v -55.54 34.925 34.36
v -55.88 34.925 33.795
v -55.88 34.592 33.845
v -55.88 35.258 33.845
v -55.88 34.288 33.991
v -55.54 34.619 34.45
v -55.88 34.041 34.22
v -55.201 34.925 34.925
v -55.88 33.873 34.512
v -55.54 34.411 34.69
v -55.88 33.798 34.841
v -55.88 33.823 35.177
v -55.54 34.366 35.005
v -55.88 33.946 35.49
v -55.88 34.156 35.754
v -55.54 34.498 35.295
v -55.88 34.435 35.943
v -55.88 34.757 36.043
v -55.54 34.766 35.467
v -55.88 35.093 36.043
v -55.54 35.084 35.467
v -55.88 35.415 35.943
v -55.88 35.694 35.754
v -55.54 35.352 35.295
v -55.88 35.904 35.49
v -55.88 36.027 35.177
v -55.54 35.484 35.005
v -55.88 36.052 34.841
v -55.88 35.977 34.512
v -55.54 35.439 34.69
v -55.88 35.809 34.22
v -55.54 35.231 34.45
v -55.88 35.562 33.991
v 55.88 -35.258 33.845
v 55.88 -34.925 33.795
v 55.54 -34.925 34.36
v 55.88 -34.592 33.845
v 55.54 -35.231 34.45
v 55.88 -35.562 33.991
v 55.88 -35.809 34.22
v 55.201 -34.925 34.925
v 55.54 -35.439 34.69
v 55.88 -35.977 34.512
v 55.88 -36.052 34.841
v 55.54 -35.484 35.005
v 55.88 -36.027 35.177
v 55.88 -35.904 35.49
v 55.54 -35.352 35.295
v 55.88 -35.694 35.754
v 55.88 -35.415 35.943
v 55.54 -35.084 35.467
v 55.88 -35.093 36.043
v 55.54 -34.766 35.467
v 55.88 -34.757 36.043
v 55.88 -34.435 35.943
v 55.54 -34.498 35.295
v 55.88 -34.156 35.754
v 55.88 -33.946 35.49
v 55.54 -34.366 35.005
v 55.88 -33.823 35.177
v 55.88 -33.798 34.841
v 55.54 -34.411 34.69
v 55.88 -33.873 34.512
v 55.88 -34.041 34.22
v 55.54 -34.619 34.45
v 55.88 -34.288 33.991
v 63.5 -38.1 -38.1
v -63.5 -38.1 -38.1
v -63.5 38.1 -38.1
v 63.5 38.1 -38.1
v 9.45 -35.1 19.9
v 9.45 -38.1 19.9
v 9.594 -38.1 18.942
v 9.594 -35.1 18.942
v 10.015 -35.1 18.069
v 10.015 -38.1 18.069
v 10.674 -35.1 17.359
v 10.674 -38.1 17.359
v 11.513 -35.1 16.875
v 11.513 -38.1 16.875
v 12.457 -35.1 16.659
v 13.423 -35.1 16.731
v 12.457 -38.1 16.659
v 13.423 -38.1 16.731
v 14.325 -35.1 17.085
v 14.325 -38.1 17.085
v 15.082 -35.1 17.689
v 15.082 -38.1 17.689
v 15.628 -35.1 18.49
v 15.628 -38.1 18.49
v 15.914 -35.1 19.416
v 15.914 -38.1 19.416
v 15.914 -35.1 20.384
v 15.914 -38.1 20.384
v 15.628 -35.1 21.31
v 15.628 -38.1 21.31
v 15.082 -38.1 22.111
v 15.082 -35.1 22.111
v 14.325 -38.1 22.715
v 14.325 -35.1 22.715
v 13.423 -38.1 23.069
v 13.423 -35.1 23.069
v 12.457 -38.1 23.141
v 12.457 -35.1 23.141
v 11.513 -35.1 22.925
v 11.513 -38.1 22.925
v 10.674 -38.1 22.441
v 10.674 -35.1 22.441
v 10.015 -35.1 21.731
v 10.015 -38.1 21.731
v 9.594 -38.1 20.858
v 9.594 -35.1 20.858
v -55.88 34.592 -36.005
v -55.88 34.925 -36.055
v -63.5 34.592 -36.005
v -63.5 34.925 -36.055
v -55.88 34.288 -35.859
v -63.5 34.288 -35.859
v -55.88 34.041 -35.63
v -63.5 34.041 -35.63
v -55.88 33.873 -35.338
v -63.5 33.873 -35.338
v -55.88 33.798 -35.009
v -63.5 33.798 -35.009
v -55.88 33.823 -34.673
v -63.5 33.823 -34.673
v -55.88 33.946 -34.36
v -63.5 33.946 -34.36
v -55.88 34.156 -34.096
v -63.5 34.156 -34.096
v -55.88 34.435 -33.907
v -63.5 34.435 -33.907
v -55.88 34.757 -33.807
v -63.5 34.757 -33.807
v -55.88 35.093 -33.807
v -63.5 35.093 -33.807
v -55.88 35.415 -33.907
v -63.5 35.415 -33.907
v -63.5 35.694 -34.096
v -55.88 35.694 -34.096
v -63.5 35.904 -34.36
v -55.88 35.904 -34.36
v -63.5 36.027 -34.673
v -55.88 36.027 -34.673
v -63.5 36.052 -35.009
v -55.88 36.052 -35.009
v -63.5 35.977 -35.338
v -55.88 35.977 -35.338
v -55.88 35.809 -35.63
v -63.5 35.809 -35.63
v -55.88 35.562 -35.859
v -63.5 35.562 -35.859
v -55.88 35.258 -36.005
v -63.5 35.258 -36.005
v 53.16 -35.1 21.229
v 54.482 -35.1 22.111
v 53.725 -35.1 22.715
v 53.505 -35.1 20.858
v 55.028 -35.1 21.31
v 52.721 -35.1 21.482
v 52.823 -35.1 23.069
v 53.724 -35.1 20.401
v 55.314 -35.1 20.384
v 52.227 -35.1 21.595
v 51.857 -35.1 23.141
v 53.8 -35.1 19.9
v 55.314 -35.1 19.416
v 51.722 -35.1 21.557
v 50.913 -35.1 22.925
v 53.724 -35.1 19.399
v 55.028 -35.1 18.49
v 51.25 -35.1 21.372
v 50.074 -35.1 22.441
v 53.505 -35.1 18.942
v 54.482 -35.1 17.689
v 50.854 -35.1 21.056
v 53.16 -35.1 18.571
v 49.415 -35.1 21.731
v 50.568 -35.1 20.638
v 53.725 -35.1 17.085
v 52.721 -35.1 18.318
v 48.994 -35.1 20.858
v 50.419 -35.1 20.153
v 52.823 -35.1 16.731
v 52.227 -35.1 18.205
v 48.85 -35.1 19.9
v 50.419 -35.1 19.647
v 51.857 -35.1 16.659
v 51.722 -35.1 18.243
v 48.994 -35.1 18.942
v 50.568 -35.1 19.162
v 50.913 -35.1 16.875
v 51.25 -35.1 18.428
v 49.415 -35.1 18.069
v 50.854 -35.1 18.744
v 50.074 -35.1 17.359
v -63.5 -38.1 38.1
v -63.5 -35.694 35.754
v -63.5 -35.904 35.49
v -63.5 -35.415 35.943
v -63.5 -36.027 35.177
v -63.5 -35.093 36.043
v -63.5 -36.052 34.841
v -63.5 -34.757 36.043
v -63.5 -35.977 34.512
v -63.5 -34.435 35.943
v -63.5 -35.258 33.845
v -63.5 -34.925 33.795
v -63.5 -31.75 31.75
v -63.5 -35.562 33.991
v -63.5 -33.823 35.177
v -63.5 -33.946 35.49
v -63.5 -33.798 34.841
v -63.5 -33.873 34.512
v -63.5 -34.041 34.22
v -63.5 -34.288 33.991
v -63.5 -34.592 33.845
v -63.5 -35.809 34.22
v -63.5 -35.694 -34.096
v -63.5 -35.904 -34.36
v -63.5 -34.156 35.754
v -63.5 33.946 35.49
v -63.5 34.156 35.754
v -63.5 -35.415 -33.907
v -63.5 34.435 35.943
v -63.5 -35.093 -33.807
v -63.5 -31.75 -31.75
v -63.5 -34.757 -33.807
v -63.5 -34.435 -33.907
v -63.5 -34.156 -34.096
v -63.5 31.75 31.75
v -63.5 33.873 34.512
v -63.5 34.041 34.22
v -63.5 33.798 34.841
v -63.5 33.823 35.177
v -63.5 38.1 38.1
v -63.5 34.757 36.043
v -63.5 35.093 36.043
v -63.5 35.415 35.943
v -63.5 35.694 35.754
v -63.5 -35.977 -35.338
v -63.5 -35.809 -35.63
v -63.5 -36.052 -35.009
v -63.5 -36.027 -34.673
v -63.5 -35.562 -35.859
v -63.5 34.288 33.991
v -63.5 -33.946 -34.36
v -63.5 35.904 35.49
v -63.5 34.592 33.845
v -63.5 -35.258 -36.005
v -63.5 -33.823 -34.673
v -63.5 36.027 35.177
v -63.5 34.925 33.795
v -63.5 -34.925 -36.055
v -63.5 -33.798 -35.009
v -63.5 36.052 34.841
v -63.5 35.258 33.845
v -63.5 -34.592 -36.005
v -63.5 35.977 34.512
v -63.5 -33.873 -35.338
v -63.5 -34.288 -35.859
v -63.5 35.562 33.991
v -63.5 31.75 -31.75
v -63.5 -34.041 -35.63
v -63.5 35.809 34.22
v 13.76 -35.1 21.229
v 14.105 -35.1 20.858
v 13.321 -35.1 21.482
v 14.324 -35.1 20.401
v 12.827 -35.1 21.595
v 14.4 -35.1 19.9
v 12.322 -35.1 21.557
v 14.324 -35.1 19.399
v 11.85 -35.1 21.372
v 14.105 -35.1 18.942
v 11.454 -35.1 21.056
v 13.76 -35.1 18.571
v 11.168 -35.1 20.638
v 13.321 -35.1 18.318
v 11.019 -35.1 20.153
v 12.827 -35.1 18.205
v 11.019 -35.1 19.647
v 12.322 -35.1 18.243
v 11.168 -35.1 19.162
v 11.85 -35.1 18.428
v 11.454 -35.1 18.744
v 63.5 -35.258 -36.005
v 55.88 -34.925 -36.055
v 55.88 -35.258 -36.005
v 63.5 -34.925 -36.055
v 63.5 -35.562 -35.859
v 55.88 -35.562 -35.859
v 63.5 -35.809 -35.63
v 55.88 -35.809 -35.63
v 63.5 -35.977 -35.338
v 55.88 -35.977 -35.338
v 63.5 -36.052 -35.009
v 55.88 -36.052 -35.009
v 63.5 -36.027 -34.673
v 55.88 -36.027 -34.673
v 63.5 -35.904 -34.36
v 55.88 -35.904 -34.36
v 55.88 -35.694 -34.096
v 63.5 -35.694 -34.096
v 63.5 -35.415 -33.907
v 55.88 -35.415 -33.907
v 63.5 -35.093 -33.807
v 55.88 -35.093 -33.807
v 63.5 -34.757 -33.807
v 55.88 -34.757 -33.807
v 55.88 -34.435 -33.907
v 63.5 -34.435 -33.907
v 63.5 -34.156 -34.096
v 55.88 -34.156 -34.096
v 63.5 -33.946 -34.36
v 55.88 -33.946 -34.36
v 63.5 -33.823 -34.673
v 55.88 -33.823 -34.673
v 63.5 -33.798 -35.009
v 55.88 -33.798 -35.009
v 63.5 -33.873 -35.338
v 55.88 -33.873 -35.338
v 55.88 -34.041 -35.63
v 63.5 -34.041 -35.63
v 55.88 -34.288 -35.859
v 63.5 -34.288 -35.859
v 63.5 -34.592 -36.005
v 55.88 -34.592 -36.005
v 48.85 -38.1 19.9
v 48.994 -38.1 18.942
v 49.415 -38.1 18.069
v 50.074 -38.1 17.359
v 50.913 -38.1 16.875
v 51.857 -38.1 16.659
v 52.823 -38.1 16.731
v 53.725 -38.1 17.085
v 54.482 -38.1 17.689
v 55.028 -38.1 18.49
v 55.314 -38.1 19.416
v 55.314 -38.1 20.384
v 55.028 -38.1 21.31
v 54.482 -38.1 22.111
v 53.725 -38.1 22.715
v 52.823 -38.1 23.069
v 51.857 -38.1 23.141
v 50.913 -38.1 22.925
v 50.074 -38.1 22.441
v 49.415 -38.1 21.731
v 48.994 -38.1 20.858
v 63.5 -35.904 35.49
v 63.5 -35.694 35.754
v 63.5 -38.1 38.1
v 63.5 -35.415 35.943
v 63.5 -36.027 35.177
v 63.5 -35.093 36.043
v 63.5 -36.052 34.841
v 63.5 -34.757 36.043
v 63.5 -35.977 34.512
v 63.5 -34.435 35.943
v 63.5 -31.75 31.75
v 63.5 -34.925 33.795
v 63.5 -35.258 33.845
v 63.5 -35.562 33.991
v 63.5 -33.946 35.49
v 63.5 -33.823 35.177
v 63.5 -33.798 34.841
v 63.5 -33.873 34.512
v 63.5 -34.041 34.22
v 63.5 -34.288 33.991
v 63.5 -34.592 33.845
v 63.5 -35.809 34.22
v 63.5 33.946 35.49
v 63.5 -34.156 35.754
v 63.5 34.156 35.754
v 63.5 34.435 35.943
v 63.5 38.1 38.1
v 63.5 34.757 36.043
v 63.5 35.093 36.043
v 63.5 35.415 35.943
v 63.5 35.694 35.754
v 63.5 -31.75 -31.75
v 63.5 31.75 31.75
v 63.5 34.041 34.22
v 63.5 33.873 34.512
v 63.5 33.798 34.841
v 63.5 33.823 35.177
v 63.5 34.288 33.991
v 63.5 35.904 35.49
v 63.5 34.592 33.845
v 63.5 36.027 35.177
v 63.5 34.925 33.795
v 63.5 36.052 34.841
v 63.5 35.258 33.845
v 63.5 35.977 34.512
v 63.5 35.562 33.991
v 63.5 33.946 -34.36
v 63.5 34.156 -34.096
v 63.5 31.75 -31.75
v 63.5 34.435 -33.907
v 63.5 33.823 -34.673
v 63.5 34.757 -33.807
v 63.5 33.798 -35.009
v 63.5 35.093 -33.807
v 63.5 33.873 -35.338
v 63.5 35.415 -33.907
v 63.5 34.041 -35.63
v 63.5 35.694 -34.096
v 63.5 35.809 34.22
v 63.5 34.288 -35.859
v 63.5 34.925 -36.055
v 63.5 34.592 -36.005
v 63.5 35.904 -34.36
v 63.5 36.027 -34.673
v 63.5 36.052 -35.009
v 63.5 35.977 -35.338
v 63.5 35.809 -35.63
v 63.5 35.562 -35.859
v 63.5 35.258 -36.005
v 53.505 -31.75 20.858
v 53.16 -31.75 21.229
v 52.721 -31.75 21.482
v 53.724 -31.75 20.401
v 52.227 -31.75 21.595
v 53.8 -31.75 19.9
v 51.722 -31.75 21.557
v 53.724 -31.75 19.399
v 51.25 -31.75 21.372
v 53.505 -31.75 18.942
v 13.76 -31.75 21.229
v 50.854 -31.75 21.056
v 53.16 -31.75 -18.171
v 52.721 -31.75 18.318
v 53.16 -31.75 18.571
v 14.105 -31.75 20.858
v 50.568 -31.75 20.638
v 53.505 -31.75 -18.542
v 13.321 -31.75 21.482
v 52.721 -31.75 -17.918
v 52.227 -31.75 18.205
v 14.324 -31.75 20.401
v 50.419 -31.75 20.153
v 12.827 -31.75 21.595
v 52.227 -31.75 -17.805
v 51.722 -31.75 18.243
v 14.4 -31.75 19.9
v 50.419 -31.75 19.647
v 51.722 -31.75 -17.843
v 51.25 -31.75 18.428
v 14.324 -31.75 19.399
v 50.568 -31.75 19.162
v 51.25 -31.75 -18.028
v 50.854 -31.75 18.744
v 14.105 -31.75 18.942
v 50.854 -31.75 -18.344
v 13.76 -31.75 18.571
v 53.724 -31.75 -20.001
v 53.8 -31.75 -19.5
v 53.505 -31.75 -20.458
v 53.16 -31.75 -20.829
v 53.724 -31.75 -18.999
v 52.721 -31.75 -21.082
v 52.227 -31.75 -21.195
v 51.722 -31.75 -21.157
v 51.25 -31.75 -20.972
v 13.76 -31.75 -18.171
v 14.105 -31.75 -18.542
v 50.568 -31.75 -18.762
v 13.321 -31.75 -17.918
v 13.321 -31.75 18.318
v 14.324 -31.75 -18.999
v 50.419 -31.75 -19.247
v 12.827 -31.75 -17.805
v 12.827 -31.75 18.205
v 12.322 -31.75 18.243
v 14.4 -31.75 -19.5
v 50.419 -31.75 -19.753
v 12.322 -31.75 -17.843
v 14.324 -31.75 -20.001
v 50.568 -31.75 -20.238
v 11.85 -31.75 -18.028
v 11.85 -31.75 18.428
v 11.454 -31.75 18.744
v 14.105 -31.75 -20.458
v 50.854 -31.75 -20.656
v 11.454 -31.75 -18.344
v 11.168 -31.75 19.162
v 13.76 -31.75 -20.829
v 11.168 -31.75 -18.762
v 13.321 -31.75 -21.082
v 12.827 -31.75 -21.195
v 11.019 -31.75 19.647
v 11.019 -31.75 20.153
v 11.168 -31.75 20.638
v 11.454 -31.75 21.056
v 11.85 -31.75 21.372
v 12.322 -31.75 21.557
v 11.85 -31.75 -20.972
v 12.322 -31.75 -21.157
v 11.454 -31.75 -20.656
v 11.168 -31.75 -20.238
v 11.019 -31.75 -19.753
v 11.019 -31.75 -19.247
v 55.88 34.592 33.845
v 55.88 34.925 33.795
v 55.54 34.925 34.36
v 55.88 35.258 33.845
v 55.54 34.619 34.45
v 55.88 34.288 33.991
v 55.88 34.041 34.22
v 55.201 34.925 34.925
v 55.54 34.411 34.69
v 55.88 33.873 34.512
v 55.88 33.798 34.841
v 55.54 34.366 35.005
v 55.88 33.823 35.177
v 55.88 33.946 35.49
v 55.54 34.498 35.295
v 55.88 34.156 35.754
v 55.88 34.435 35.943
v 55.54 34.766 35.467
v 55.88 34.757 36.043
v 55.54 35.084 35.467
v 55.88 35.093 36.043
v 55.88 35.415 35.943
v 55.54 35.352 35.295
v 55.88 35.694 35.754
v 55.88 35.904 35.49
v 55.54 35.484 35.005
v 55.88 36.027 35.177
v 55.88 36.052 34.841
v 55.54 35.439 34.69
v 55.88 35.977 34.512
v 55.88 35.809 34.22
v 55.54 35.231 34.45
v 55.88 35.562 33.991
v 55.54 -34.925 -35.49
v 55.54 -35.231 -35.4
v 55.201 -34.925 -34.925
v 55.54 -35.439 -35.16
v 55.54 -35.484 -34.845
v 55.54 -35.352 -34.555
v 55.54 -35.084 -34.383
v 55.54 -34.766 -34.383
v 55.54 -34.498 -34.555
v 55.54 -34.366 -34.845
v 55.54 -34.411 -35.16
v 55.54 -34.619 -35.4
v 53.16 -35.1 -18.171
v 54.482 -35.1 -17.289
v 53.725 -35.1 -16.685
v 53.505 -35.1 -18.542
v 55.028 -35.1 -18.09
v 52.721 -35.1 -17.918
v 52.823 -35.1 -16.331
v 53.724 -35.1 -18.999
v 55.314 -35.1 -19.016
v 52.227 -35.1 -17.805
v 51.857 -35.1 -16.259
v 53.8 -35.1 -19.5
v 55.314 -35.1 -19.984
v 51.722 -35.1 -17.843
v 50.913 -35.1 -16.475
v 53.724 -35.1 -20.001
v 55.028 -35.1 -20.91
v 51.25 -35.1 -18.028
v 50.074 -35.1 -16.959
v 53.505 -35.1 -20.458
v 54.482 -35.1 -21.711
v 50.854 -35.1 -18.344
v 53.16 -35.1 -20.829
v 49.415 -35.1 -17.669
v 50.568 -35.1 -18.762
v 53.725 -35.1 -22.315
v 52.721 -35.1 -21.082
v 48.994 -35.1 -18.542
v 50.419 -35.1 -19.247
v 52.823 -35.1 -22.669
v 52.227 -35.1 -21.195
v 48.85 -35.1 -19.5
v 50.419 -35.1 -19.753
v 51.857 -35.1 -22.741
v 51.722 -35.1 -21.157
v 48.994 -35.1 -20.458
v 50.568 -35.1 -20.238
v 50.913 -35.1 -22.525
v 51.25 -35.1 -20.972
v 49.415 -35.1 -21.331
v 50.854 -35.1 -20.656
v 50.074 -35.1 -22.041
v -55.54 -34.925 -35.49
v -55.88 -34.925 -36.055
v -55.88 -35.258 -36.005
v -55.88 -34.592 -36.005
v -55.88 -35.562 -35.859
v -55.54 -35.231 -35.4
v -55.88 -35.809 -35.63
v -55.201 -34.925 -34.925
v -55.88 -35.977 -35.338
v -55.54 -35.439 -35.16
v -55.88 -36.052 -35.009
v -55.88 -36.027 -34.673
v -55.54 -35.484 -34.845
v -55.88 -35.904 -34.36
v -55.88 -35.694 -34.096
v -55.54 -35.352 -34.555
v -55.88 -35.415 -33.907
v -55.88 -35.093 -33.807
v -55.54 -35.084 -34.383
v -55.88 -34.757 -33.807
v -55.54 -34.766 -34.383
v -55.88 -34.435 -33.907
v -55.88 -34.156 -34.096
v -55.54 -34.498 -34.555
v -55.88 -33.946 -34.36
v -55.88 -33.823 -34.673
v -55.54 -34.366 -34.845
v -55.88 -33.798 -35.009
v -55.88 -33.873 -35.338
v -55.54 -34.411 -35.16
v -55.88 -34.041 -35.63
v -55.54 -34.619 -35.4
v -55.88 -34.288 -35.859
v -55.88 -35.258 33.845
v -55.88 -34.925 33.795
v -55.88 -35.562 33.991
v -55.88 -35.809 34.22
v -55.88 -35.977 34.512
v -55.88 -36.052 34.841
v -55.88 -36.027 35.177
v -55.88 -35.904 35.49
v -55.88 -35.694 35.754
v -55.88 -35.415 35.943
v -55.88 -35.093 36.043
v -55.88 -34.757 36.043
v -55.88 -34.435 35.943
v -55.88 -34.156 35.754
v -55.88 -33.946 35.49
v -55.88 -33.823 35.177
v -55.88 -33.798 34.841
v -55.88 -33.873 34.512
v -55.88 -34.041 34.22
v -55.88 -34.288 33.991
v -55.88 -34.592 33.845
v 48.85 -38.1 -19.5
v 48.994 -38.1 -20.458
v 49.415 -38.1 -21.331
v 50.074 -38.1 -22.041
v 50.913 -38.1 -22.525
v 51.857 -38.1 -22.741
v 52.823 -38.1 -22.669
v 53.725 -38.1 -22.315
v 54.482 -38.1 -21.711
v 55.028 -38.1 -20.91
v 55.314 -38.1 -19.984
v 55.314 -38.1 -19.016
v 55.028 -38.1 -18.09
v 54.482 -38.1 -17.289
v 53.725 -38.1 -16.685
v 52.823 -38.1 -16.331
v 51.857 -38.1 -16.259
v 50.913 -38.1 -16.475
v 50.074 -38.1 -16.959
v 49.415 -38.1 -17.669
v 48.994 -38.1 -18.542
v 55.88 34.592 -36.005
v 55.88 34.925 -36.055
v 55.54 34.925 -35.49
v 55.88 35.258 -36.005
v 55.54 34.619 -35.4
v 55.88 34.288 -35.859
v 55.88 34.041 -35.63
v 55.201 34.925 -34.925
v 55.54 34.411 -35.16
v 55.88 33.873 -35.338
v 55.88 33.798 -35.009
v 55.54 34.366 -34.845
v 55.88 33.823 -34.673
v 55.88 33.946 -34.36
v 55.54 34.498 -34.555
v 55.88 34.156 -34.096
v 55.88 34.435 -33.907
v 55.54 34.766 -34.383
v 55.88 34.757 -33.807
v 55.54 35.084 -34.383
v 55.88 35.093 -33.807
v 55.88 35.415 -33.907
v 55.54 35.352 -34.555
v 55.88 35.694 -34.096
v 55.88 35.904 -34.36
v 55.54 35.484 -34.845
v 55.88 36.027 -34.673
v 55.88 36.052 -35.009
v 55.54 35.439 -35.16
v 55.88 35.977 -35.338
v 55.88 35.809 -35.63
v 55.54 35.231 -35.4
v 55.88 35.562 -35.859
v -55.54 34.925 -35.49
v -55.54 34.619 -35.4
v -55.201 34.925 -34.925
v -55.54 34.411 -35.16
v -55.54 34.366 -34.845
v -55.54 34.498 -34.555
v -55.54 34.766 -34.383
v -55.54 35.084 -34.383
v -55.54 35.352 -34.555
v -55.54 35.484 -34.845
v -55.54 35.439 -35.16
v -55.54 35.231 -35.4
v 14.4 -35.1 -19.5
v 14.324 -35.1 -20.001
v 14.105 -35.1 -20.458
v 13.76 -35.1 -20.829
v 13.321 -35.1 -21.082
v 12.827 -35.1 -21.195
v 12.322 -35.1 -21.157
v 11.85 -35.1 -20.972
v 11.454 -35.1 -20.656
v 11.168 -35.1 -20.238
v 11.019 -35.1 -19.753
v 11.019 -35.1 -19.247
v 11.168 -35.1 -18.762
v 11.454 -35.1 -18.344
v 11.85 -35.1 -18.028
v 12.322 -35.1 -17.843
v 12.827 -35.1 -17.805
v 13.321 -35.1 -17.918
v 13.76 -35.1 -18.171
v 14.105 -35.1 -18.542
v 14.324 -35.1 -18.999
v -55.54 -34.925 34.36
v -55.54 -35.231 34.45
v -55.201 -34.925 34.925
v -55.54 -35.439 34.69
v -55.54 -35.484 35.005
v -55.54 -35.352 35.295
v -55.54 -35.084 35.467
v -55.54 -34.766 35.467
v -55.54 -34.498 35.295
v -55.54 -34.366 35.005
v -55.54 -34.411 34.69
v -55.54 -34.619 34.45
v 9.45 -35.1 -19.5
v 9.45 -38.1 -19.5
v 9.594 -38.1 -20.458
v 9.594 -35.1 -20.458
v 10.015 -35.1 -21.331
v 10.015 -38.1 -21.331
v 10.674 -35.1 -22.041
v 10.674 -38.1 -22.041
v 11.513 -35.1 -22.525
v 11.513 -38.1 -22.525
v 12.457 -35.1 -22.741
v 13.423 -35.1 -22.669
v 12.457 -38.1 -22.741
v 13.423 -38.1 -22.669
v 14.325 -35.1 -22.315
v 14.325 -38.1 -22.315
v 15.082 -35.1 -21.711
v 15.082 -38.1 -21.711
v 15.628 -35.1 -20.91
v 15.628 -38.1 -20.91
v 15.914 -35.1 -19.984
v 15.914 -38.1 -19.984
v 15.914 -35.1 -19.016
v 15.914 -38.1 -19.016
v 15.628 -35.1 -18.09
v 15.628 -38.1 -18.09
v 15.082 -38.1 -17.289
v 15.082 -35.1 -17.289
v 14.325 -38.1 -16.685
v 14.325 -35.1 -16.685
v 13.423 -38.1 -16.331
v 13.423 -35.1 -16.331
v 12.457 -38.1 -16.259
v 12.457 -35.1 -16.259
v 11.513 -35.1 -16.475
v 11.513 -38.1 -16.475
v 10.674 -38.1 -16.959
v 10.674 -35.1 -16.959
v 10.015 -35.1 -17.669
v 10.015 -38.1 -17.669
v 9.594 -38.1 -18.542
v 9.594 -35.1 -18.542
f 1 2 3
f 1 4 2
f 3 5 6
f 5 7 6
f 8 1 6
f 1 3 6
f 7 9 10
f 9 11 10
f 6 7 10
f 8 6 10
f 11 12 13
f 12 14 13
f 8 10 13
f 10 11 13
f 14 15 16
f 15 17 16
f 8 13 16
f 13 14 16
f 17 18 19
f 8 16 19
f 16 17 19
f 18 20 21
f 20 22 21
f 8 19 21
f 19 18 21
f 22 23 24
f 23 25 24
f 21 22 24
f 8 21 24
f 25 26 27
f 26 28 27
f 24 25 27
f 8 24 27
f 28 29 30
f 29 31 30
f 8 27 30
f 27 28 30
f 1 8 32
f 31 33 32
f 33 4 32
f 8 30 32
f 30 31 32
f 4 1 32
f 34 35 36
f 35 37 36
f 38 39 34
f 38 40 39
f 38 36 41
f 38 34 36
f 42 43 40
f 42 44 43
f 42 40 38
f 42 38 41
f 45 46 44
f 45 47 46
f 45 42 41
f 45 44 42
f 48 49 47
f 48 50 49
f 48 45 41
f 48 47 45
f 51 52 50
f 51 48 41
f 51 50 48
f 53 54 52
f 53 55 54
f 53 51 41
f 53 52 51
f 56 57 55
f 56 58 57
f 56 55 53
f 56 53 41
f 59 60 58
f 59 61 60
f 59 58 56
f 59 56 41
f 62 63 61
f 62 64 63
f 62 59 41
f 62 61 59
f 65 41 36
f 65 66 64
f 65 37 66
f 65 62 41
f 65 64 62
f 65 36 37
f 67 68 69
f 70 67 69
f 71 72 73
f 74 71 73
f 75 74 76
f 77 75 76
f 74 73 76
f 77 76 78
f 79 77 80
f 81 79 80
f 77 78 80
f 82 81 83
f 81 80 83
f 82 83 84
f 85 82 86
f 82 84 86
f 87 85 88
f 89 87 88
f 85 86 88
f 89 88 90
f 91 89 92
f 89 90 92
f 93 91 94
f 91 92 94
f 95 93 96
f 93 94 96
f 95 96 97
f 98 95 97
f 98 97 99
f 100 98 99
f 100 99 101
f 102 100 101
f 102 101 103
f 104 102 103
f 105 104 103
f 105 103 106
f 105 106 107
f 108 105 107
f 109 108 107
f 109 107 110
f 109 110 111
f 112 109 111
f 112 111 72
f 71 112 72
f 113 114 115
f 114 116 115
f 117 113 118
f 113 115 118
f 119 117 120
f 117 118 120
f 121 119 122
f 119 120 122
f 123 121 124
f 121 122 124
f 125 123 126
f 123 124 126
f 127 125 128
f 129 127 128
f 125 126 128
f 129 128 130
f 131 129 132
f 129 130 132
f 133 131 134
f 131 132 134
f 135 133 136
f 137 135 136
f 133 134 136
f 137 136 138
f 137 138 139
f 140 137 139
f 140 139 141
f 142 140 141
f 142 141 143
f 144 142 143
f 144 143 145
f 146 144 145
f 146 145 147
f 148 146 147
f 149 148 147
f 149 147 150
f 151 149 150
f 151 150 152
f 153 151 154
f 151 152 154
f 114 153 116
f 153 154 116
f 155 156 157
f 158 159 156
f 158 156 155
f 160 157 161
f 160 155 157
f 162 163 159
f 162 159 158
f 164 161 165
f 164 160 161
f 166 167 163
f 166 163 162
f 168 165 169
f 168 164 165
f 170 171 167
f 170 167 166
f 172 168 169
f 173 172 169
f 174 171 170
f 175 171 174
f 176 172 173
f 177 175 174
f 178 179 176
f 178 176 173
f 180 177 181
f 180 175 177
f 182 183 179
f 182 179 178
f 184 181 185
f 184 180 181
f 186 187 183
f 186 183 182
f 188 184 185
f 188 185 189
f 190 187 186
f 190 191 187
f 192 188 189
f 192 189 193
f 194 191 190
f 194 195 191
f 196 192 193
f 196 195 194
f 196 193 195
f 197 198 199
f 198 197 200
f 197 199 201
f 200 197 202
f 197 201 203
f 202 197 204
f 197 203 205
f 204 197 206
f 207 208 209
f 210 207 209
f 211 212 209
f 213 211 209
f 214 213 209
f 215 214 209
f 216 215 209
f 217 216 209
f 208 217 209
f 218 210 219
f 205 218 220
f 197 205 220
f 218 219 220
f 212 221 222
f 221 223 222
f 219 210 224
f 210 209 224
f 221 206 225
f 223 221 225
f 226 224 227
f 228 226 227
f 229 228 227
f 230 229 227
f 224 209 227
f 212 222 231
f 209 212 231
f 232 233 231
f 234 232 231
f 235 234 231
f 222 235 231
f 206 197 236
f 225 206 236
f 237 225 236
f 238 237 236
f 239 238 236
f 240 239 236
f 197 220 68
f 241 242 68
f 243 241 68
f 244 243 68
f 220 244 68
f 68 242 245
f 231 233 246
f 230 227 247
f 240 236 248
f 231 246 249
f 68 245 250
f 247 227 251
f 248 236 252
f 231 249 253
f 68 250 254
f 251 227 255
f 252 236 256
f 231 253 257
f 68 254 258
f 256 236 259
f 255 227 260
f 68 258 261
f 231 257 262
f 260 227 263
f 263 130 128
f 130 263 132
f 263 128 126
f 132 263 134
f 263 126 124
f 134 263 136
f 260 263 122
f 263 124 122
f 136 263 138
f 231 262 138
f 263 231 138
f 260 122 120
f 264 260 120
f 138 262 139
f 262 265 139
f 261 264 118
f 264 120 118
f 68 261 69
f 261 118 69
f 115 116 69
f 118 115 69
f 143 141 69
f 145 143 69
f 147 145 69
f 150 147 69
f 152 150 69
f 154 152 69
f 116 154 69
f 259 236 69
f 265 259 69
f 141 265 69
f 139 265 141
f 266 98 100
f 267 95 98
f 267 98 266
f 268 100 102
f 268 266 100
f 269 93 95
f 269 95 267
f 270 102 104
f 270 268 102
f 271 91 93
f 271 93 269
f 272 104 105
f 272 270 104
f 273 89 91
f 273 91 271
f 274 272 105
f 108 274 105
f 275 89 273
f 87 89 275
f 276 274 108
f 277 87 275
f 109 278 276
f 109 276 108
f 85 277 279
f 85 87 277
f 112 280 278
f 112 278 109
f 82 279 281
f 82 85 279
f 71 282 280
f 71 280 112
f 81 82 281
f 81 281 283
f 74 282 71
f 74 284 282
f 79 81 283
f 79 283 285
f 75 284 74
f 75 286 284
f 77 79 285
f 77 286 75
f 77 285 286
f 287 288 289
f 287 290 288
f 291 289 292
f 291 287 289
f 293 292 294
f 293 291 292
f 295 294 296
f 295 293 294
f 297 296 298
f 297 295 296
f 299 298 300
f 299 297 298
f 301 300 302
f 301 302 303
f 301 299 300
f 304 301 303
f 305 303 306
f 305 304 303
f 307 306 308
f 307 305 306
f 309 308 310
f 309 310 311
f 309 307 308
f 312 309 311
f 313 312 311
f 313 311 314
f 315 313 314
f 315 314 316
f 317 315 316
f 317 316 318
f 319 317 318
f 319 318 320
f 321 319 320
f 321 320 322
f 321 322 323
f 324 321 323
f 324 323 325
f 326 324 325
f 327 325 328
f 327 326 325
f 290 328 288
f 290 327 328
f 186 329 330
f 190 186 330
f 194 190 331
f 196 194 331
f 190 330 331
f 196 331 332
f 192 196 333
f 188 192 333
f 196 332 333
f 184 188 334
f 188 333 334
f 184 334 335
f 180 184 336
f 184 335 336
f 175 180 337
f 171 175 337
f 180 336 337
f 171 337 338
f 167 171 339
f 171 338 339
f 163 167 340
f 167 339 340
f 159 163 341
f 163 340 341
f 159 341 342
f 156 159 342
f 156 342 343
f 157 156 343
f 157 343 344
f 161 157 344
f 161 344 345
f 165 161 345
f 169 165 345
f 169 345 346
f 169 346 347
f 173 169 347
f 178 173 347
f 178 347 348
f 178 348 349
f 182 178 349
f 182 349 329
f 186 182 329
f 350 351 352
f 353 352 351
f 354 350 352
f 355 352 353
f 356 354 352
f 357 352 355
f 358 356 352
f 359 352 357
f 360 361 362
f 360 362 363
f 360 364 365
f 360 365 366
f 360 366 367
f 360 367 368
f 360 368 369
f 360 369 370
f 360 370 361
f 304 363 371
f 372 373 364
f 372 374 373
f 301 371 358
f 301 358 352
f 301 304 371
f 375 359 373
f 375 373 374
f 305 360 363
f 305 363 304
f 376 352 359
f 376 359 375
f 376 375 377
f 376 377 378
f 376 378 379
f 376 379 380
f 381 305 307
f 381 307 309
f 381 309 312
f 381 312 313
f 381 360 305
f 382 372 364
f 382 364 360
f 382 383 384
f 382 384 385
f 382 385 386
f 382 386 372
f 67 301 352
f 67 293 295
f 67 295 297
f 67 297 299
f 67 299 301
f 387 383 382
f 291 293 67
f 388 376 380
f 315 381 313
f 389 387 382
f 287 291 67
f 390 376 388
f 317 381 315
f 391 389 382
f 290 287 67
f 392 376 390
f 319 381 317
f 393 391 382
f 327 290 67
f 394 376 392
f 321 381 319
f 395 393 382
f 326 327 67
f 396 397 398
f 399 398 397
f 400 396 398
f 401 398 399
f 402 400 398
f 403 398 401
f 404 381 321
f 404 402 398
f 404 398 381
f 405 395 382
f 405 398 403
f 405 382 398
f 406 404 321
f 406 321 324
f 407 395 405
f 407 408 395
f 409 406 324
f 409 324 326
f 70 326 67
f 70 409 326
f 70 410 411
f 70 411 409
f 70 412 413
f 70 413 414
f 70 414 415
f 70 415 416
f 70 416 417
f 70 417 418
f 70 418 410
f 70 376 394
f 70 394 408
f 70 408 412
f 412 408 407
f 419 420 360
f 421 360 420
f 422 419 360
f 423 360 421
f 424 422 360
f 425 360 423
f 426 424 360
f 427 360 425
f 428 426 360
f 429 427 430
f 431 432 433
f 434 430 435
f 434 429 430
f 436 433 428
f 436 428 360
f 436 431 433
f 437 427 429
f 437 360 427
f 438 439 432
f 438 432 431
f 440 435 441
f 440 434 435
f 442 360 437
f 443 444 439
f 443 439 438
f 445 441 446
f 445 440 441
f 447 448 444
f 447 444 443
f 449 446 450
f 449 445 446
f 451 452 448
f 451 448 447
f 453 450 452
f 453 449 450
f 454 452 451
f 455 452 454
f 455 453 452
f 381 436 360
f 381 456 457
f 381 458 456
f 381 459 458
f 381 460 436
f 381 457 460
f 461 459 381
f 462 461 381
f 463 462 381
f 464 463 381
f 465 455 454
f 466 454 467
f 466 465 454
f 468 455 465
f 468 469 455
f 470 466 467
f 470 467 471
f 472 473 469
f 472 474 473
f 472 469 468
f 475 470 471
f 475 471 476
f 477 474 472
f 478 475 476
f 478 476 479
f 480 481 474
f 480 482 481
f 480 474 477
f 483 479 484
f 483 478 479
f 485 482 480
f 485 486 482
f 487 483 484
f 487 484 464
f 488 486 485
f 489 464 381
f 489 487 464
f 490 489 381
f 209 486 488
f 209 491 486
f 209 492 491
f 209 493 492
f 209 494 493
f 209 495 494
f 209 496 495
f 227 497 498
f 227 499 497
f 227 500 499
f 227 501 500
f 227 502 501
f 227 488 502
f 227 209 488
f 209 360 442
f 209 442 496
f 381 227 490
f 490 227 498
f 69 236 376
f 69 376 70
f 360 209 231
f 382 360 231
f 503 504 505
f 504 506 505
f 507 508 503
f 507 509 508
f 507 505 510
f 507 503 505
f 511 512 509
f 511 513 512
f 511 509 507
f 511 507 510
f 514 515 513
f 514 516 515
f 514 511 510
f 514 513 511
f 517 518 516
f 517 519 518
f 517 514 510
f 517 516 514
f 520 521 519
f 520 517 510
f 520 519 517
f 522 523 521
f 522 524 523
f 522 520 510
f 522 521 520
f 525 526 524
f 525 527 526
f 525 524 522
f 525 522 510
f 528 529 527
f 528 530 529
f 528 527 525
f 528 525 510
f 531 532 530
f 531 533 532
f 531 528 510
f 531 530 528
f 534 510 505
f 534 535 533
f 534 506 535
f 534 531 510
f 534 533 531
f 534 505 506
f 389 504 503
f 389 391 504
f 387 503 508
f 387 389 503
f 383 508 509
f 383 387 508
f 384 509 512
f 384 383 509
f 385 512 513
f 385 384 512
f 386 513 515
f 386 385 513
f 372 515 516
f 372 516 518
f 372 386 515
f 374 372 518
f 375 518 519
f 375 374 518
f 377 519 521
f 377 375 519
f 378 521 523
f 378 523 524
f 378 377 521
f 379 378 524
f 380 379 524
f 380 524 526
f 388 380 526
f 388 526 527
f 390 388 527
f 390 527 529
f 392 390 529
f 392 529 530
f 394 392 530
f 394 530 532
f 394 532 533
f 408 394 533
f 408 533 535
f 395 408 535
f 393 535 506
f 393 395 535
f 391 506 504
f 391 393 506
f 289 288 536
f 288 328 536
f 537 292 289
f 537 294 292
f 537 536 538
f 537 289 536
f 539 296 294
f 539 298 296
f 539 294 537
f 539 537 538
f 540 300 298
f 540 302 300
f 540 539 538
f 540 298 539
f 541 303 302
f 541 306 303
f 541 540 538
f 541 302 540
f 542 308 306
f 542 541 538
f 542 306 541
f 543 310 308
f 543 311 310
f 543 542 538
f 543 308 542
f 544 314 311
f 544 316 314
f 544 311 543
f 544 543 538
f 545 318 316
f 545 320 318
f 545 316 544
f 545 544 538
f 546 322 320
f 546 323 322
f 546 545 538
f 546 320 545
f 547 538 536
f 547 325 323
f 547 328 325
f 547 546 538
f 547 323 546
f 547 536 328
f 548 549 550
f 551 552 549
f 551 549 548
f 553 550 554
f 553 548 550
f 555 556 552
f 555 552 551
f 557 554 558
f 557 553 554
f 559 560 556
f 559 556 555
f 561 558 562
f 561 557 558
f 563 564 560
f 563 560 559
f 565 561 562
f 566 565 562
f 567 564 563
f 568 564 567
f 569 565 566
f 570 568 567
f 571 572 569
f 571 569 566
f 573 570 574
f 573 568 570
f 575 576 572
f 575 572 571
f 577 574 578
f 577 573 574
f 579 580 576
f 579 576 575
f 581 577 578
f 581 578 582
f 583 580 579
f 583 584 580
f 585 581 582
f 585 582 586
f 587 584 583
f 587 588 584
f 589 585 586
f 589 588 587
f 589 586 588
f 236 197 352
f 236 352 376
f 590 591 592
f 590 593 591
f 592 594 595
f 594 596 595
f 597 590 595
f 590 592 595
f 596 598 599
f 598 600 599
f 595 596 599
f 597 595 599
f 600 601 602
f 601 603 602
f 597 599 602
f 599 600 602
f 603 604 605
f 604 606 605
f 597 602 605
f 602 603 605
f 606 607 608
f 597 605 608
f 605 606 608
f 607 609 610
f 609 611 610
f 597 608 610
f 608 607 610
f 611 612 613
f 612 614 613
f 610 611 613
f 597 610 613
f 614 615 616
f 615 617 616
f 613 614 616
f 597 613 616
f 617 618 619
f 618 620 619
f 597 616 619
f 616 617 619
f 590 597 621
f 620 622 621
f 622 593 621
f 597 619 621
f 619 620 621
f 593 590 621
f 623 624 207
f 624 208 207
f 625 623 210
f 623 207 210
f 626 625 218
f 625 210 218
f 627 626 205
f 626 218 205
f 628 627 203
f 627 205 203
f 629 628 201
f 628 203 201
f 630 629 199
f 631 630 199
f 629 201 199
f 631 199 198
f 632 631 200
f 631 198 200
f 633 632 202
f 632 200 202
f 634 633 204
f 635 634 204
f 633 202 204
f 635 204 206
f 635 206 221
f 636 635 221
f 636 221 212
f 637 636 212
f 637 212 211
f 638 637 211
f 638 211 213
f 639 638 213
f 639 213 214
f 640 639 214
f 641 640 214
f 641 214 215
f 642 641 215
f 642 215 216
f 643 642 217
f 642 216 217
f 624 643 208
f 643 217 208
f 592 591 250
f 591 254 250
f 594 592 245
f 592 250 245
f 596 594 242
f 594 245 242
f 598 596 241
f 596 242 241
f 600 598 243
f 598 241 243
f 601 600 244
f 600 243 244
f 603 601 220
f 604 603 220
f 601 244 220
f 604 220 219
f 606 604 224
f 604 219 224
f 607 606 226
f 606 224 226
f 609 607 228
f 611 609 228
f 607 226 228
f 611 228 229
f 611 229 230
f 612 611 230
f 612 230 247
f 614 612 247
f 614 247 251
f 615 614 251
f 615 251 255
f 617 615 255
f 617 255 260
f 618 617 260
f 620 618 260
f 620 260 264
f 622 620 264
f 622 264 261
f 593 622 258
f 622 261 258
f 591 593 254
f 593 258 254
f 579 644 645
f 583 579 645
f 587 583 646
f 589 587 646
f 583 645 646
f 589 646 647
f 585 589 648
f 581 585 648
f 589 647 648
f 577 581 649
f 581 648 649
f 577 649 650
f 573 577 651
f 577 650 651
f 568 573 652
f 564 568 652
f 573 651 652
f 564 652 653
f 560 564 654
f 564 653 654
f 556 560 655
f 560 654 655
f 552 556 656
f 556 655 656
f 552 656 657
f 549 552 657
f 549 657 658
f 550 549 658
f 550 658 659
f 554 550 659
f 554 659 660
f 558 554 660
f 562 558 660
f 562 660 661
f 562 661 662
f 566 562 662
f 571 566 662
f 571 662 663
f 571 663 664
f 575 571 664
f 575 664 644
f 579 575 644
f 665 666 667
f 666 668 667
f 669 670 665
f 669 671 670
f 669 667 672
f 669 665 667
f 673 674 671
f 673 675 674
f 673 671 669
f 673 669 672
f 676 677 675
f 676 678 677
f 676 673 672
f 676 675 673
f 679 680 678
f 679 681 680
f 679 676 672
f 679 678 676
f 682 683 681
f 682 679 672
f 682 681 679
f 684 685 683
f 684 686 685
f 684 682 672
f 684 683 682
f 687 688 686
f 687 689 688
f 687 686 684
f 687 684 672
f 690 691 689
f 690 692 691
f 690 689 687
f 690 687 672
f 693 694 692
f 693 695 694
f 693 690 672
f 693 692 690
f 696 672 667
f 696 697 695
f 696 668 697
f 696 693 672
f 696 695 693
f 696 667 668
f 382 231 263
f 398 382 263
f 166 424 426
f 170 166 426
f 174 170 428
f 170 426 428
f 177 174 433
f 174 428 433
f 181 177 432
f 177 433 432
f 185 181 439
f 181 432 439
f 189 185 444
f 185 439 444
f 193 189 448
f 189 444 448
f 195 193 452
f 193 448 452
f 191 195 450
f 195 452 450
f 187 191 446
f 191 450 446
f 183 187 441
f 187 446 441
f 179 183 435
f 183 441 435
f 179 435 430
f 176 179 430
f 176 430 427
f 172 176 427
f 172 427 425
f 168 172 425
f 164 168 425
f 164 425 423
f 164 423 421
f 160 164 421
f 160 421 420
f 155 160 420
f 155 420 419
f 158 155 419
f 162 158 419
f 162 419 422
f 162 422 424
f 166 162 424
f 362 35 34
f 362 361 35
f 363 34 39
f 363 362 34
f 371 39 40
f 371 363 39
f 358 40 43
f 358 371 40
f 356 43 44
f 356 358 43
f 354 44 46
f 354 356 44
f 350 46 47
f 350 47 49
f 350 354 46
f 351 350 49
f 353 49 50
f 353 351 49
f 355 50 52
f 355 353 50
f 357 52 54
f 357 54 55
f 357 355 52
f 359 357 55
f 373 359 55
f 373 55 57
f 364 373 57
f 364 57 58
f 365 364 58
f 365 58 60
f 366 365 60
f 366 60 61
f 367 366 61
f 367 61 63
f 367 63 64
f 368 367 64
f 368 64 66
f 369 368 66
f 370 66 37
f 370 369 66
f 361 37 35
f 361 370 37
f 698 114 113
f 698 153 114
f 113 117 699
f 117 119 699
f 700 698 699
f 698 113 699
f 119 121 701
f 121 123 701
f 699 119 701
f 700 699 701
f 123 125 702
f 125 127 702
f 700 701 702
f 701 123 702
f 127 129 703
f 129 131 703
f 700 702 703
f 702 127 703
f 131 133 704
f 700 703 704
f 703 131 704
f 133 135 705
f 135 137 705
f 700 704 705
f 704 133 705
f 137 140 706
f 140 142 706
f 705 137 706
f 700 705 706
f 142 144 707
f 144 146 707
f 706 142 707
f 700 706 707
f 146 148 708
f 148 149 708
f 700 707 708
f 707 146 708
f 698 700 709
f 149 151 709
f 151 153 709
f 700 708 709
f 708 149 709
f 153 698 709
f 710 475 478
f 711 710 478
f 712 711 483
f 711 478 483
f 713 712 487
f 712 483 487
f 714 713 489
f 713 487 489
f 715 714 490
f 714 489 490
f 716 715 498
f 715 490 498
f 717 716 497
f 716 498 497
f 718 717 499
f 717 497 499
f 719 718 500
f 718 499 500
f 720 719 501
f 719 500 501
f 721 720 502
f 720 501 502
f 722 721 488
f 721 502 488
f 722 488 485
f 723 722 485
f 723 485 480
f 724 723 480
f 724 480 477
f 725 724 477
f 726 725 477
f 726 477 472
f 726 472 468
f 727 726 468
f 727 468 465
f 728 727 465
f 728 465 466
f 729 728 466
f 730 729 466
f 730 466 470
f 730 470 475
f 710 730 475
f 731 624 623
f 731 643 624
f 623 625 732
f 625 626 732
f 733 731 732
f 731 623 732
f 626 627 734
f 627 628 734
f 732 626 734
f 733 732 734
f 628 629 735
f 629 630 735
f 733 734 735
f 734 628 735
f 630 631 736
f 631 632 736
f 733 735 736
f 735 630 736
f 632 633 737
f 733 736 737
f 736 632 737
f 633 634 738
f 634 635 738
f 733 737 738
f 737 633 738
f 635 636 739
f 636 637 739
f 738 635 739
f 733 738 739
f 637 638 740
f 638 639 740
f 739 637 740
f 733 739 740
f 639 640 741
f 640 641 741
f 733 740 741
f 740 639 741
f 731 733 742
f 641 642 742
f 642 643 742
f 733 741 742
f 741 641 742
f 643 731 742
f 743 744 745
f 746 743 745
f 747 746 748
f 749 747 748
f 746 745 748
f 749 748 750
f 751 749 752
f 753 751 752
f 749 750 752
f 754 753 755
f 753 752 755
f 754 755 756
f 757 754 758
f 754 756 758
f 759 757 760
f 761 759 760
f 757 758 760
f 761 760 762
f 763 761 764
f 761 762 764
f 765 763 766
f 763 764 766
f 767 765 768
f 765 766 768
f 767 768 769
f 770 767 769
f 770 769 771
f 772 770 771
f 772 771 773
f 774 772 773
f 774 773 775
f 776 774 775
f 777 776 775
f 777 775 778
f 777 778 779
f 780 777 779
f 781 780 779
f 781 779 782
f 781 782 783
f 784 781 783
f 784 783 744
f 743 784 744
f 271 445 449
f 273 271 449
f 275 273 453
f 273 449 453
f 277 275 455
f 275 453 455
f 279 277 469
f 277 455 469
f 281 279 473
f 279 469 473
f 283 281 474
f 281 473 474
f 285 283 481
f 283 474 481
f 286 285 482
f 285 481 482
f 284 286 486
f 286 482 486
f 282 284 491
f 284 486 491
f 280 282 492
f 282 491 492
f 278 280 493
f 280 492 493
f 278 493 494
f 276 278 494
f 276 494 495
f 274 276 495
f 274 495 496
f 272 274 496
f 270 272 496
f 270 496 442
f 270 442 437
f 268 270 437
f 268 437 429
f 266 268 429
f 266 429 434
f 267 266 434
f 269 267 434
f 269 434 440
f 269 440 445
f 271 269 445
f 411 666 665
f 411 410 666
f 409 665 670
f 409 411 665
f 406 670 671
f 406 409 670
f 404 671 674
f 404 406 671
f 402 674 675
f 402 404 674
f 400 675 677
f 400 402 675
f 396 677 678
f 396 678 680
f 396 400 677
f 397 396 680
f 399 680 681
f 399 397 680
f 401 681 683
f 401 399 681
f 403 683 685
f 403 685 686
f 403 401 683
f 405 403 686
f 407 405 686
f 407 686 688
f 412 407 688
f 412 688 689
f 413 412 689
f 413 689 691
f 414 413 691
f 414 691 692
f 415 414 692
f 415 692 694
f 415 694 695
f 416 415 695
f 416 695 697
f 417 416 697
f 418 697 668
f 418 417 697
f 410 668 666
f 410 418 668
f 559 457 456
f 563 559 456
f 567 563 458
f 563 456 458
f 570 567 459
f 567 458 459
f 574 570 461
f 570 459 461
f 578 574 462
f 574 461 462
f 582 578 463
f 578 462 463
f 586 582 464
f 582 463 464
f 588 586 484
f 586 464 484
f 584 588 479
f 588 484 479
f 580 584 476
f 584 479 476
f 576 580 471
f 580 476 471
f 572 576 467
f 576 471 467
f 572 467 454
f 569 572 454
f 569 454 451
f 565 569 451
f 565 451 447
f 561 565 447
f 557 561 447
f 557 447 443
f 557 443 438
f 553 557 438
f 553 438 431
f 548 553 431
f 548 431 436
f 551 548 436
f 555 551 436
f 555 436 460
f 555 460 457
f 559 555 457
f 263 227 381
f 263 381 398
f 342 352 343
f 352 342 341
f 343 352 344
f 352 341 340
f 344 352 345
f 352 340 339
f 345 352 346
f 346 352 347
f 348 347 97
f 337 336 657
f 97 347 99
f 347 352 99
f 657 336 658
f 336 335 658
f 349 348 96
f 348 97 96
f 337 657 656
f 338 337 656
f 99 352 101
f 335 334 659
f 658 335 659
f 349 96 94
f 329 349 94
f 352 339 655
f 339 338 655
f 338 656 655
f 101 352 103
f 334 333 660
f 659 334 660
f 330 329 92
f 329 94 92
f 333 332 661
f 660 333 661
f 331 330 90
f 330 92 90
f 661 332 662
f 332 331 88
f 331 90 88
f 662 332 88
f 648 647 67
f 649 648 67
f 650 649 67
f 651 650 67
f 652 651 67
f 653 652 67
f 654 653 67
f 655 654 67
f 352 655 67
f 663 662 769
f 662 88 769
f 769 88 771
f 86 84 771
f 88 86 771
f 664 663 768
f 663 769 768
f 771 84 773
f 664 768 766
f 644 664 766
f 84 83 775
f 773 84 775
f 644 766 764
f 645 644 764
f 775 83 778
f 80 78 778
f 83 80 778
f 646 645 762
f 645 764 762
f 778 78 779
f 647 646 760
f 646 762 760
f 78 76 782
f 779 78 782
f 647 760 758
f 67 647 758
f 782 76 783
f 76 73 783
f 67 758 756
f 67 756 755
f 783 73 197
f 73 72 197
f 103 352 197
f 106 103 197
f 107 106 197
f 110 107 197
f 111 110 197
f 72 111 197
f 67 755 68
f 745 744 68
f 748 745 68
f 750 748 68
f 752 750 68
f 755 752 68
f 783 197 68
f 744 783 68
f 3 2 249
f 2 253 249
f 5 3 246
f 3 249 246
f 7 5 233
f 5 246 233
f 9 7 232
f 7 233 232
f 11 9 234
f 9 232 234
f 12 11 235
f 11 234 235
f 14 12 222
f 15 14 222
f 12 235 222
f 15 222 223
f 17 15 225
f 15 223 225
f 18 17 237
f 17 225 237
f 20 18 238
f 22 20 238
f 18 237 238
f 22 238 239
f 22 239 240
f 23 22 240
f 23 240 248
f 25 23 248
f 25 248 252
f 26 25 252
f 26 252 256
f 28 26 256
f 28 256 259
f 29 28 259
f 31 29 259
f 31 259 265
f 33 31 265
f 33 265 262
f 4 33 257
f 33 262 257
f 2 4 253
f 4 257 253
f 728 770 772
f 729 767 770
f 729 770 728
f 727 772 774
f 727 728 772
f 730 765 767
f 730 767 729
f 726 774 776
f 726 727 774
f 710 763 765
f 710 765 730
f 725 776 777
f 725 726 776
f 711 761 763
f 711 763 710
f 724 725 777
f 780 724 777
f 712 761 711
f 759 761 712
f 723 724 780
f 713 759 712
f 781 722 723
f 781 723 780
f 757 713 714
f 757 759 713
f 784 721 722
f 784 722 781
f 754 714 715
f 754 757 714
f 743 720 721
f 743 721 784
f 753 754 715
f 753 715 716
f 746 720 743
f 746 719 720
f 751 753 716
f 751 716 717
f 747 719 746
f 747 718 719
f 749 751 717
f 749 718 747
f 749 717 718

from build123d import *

# Parameters (mm, degrees)
BOSS_EXTRUDE1_DEPTH            = 63.5
BOSS_EXTRUDE1_DEPTH_BACK       = 63.5
SKETCH1_W                      = 76.2
SKETCH1_H                      = 76.2
SKETCH1_W_2                    = 63.5
SKETCH1_H_2                    = 63.5
F_4_40_TAPPED_HOLE1_AT_2_COUNT = 2
F_4_40_TAPPED_HOLE1_AT_2_PITCH = 69.85
F_4_40_TAPPED_HOLE1_AT_3_COUNT = 2
F_4_40_TAPPED_HOLE1_AT_3_PITCH = 98.782817332
F_4_40_TAPPED_HOLE1_AT_4_COUNT = 2
F_4_40_TAPPED_HOLE1_AT_4_PITCH = 69.85
CBORE_FOR_M3_SHCS1_D           = 3.4
CBORE_FOR_M3_SHCS1_DEPTH       = 6.35
CBORE_FOR_M3_SHCS1_CBORE_D     = 6.5
CBORE_FOR_M3_SHCS1_CBORE_DEPTH = 3


with BuildPart() as part:
    # Sketch1 → Boss-Extrude1 (new, two sides: drawn at the far end of the back side and taken through both)
    with BuildSketch(Plane(origin=(0, 0, 0), x_dir=(0, 0, -1), z_dir=(1, 0, 0)).offset(-BOSS_EXTRUDE1_DEPTH_BACK)):
        Rectangle(SKETCH1_W, SKETCH1_H)
        Rectangle(SKETCH1_W_2, SKETCH1_H_2, mode=Mode.SUBTRACT)
    extrude(amount=BOSS_EXTRUDE1_DEPTH + BOSS_EXTRUDE1_DEPTH_BACK)

    # Sketch3 → #4-40 Tapped Hole1 (revolve, cut)
    with BuildSketch(Plane(origin=(63.5, 34.925, 34.925), x_dir=(0, 0, -1), z_dir=(0, 1, 0))):
        Polygon((0, 0), (0, 8.299152758), (1.1303, 7.62), (1.1303, 0), align=None)
    f_4_40_tapped_hole1 = revolve(axis=Axis((69.85, 34.925, 34.925), (-1, 0, 0)), mode=Mode.SUBTRACT)

    # #4-40 Tapped Hole1 at 2: #4-40 Tapped Hole1 ×2
    with Locations(*[(0, 0, -i * F_4_40_TAPPED_HOLE1_AT_2_PITCH) for i in range(1, F_4_40_TAPPED_HOLE1_AT_2_COUNT)]):
        add(f_4_40_tapped_hole1, mode=Mode.SUBTRACT)

    # #4-40 Tapped Hole1 at 3: #4-40 Tapped Hole1 ×2
    with Locations(*[Vector(0, -0.7071067811865475, -0.7071067811865476) * (i * F_4_40_TAPPED_HOLE1_AT_3_PITCH) for i in range(1, F_4_40_TAPPED_HOLE1_AT_3_COUNT)]):
        add(f_4_40_tapped_hole1, mode=Mode.SUBTRACT)

    # #4-40 Tapped Hole1 at 4: #4-40 Tapped Hole1 ×2
    with Locations(*[(0, -i * F_4_40_TAPPED_HOLE1_AT_4_PITCH, 0) for i in range(1, F_4_40_TAPPED_HOLE1_AT_4_COUNT)]):
        add(f_4_40_tapped_hole1, mode=Mode.SUBTRACT)

    # Mirror1: #4-40 Tapped Hole1 across plane
    add(f_4_40_tapped_hole1.mirror(Plane(origin=(0, 0, 0), x_dir=(0, 0, 1), z_dir=(1, 0, 0))), mode=Mode.SUBTRACT)

    # Mirror1 copy 1 sketch → Mirror1 copy 1 (revolve, cut)
    with BuildSketch(Plane(origin=(-63.5, 34.925, -34.925), x_dir=(0, 0, -1), z_dir=(0, 1, 0))):
        Polygon((0, 0), (0, -8.299152758), (1.1303, -7.62), (1.1303, 0), align=None)
    revolve(axis=Axis((-69.85, 34.925, -34.925), (-1, 0, 0)), mode=Mode.SUBTRACT)

    # Mirror1 copy 2 sketch → Mirror1 copy 2 (revolve, cut)
    with BuildSketch(Plane(origin=(-63.5, -34.925, -34.925), x_dir=(0, 0, -1), z_dir=(0, 1, 0))):
        Polygon((0, 0), (0, -8.299152758), (1.1303, -7.62), (1.1303, 0), align=None)
    revolve(axis=Axis((-69.85, -34.925, -34.925), (-1, 0, 0)), mode=Mode.SUBTRACT)

    # Mirror1 copy 3 sketch → Mirror1 copy 3 (revolve, cut)
    with BuildSketch(Plane(origin=(-63.5, -34.925, 34.925), x_dir=(0, 0, -1), z_dir=(0, 1, 0))):
        Polygon((0, 0), (0, -8.299152758), (1.1303, -7.62), (1.1303, 0), align=None)
    revolve(axis=Axis((-69.85, -34.925, 34.925), (-1, 0, 0)), mode=Mode.SUBTRACT)

    # CBORE for M3 SHCS1
    with Locations(Plane(origin=(0, -38.1, 0), x_dir=(-1, 0, 0), z_dir=(0, -1, 0))):
        with Locations((-52.09999994, 19.499999922), (-12.7, 19.499999922), (-12.7, -19.900000078), (-52.1, -19.900000078)):
            CounterBoreHole(CBORE_FOR_M3_SHCS1_D / 2, CBORE_FOR_M3_SHCS1_CBORE_D / 2, CBORE_FOR_M3_SHCS1_CBORE_DEPTH, depth=CBORE_FOR_M3_SHCS1_DEPTH)


solid = part.part
